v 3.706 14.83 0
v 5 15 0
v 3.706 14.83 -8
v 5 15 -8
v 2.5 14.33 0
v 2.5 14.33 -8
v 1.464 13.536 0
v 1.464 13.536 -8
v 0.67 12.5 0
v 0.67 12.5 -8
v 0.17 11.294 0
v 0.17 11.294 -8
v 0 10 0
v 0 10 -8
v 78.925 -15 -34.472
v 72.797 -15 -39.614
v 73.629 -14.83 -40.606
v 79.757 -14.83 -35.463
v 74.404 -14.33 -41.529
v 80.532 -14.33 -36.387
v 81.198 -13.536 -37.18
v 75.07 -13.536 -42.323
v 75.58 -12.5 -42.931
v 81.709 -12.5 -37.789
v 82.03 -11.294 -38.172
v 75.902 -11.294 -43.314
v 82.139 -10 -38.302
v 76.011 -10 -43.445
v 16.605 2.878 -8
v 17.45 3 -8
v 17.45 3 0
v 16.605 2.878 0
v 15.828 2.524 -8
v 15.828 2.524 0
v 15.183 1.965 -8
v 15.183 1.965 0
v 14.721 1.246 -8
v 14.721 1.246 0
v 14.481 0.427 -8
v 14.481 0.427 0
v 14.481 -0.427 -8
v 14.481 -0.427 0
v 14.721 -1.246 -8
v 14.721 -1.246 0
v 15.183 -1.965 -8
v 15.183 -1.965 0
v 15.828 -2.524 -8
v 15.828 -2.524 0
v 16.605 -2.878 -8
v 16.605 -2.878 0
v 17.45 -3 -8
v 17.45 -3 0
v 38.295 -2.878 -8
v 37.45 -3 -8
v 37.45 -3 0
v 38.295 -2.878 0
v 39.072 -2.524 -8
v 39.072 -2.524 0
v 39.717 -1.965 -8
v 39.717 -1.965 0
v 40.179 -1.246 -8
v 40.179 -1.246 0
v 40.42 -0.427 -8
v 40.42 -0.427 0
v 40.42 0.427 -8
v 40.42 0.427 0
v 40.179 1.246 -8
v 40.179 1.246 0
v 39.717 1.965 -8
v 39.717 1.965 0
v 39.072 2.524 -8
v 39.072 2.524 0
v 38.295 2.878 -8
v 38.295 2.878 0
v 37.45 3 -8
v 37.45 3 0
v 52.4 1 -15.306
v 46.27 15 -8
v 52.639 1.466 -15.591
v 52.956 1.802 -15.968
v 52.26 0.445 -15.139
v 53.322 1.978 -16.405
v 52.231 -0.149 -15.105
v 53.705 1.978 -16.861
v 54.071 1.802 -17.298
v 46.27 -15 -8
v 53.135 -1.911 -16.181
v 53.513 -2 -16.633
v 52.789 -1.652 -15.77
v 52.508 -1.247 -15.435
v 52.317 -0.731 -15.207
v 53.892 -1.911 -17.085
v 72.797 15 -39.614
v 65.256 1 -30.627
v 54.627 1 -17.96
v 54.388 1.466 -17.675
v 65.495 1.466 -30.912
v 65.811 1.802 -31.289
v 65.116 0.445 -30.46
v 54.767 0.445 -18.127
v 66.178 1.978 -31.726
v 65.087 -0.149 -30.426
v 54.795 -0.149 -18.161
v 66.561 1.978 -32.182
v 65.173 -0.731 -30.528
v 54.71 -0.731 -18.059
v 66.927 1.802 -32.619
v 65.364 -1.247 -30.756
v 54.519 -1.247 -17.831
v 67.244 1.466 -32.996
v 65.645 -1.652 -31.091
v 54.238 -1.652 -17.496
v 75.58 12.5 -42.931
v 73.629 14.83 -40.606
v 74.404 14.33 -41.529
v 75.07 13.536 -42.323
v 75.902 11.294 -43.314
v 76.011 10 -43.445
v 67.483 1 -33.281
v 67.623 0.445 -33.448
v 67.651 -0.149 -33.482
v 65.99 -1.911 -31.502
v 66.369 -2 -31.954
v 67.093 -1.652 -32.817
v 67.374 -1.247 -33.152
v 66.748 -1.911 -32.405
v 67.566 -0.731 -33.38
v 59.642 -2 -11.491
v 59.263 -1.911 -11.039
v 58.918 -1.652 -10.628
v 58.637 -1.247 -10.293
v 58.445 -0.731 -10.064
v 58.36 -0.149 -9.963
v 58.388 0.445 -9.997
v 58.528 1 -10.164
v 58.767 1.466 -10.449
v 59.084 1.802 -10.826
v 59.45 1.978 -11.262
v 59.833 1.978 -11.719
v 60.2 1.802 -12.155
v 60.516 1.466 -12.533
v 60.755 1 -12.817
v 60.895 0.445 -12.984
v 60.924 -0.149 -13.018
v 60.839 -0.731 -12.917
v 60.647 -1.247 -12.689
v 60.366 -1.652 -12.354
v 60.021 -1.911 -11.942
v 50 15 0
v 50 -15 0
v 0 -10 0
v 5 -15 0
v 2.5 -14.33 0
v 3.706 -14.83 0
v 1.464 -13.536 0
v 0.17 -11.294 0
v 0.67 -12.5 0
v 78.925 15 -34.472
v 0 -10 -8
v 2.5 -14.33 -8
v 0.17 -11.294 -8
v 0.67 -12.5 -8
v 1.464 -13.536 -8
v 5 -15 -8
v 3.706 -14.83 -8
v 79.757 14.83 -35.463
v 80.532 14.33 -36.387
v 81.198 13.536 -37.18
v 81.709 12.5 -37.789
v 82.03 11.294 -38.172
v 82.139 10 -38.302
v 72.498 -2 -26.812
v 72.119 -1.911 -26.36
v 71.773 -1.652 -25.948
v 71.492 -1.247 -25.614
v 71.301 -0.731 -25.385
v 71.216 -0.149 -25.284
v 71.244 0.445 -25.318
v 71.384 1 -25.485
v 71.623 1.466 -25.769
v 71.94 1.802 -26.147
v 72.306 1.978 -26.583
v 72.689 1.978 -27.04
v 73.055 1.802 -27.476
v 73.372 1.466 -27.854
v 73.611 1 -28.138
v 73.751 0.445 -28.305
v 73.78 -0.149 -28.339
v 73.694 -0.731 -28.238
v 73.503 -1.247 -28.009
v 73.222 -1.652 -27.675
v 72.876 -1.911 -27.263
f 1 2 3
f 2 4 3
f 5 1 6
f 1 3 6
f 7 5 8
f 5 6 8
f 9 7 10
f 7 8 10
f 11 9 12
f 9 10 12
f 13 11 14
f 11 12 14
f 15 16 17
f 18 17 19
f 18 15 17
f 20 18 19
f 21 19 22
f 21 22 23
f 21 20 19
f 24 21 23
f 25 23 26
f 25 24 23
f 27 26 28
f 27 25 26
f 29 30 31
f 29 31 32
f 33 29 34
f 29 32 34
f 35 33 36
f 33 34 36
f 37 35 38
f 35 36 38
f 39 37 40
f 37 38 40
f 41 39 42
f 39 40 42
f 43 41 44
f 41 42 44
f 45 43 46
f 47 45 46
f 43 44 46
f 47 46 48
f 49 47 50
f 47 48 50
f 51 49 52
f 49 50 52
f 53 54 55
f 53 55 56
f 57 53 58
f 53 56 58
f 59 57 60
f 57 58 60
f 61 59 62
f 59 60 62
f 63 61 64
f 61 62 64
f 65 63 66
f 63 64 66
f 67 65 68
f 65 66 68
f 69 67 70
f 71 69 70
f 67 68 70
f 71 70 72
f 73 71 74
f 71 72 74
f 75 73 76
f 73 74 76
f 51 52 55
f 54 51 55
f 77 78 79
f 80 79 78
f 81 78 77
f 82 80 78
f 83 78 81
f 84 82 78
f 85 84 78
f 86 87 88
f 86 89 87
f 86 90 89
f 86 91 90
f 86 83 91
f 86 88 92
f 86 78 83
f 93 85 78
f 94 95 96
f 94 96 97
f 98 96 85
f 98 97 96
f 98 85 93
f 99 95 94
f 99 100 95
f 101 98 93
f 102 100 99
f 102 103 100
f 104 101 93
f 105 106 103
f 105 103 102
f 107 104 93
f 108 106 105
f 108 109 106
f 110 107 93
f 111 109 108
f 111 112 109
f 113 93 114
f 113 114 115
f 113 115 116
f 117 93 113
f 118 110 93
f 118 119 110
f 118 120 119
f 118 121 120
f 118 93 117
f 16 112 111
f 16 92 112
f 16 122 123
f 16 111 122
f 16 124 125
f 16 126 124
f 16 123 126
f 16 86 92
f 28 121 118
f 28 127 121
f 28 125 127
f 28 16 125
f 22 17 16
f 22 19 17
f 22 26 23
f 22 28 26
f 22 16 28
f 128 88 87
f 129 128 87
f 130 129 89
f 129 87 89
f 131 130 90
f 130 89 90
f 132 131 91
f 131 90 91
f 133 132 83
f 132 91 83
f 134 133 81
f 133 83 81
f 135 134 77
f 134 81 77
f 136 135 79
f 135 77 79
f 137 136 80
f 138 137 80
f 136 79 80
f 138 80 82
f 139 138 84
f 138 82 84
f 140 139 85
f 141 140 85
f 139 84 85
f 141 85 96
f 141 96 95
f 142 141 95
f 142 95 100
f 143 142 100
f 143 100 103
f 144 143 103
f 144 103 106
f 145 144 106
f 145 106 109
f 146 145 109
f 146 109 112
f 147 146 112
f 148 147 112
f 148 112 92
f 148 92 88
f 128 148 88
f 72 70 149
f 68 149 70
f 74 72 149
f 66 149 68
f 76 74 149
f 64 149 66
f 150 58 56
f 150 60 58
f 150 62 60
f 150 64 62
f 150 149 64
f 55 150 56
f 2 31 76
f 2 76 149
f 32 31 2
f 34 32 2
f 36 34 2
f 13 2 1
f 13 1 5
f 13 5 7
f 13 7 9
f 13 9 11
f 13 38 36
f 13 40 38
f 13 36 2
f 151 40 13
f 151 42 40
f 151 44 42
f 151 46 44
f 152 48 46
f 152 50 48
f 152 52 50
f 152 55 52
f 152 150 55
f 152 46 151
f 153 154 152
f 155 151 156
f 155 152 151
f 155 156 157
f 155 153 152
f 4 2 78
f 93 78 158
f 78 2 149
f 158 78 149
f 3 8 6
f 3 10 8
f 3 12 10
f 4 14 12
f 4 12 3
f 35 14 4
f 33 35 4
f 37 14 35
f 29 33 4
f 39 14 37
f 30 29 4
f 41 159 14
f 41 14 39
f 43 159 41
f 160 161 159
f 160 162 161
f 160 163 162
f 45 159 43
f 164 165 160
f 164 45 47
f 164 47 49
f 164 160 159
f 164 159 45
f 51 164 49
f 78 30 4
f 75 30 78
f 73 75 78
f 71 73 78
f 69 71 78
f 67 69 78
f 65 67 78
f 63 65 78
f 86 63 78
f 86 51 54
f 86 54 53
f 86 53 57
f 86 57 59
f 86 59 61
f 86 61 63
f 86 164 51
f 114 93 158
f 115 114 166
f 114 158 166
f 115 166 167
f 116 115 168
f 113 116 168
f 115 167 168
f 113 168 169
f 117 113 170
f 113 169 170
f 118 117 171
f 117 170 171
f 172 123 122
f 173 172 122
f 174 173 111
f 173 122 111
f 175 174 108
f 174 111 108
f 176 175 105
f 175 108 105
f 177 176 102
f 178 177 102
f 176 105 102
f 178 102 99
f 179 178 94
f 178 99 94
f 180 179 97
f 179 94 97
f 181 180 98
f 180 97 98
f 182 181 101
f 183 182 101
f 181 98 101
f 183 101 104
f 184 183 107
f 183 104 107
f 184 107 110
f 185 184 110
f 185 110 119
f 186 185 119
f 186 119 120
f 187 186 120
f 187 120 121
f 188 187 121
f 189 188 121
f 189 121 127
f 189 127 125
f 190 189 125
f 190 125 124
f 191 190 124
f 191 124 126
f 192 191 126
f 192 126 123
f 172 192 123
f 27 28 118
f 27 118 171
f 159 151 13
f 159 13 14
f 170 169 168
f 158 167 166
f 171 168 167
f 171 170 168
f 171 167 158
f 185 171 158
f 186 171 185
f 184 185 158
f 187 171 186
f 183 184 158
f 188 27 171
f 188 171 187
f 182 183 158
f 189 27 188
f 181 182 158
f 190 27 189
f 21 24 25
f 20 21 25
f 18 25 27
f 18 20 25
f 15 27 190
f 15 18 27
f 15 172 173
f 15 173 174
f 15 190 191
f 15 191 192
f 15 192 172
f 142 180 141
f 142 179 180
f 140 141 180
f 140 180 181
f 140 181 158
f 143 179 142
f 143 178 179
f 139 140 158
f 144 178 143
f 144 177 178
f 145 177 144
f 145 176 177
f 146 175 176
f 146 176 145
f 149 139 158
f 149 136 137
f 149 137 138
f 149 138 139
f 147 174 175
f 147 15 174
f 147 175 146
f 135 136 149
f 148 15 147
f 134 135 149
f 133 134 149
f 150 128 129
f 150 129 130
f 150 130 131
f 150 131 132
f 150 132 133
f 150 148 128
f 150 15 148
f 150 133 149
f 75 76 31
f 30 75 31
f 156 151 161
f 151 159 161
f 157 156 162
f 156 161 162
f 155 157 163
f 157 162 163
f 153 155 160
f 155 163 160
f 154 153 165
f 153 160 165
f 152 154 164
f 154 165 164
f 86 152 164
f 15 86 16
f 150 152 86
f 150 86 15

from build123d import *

# Parameters (mm, degrees)
F1_DEPTH = 15
F3_DEPTH = 43.4455230334
F5_D     = 4
F6_R     = 5


with BuildPart() as f1:
    # F0 (on Front) → F1 (new body, symmetric)
    with BuildSketch(Plane.XZ):
        Polygon((50, 0), (0, 0), (0, -8), (46.2695387348, -8), (76.0110249394, -43.4445230334), (82.1393804843, -38.3022221559), align=None)
    extrude(amount=F1_DEPTH, both=True)

    # F2 (on face) → F3 (cut, through all)
    with BuildSketch(Plane.XY):
        with BuildLine():
            ThreePointArc((17.4500849098, 3), (14.4500849098, 0), (17.4500849098, -3))
            Line((17.4500849098, -3), (37.4500849098, -3))
            ThreePointArc((37.4500849098, -3), (40.4500849098, 0), (37.4500849098, 3))
            Line((37.4500849098, 3), (17.4500849098, 3))
        make_face()
    extrude(amount=-F3_DEPTH, mode=Mode.SUBTRACT)

    # F5 (through all)
    with Locations(Plane(origin=(29.3412044417, 0, 24.6201938253), x_dir=(0, 1, 0), z_dir=(0.7660444431, 0, 0.6427876097))):
        with Locations((0, -47.1393804843), (0, -67.1393804843)):
            Hole(F5_D / 2)

    # F6
    f6_edges = [f1.edges().sort_by_distance(p)[0] for p in [
        (79.075203, -15, -40.873373),
        (79.075203, 15, -40.873373),
        (0, 15, -4),
        (0, -15, -4),
    ]]
    fillet(f6_edges, radius=F6_R)


solid = f1.part
